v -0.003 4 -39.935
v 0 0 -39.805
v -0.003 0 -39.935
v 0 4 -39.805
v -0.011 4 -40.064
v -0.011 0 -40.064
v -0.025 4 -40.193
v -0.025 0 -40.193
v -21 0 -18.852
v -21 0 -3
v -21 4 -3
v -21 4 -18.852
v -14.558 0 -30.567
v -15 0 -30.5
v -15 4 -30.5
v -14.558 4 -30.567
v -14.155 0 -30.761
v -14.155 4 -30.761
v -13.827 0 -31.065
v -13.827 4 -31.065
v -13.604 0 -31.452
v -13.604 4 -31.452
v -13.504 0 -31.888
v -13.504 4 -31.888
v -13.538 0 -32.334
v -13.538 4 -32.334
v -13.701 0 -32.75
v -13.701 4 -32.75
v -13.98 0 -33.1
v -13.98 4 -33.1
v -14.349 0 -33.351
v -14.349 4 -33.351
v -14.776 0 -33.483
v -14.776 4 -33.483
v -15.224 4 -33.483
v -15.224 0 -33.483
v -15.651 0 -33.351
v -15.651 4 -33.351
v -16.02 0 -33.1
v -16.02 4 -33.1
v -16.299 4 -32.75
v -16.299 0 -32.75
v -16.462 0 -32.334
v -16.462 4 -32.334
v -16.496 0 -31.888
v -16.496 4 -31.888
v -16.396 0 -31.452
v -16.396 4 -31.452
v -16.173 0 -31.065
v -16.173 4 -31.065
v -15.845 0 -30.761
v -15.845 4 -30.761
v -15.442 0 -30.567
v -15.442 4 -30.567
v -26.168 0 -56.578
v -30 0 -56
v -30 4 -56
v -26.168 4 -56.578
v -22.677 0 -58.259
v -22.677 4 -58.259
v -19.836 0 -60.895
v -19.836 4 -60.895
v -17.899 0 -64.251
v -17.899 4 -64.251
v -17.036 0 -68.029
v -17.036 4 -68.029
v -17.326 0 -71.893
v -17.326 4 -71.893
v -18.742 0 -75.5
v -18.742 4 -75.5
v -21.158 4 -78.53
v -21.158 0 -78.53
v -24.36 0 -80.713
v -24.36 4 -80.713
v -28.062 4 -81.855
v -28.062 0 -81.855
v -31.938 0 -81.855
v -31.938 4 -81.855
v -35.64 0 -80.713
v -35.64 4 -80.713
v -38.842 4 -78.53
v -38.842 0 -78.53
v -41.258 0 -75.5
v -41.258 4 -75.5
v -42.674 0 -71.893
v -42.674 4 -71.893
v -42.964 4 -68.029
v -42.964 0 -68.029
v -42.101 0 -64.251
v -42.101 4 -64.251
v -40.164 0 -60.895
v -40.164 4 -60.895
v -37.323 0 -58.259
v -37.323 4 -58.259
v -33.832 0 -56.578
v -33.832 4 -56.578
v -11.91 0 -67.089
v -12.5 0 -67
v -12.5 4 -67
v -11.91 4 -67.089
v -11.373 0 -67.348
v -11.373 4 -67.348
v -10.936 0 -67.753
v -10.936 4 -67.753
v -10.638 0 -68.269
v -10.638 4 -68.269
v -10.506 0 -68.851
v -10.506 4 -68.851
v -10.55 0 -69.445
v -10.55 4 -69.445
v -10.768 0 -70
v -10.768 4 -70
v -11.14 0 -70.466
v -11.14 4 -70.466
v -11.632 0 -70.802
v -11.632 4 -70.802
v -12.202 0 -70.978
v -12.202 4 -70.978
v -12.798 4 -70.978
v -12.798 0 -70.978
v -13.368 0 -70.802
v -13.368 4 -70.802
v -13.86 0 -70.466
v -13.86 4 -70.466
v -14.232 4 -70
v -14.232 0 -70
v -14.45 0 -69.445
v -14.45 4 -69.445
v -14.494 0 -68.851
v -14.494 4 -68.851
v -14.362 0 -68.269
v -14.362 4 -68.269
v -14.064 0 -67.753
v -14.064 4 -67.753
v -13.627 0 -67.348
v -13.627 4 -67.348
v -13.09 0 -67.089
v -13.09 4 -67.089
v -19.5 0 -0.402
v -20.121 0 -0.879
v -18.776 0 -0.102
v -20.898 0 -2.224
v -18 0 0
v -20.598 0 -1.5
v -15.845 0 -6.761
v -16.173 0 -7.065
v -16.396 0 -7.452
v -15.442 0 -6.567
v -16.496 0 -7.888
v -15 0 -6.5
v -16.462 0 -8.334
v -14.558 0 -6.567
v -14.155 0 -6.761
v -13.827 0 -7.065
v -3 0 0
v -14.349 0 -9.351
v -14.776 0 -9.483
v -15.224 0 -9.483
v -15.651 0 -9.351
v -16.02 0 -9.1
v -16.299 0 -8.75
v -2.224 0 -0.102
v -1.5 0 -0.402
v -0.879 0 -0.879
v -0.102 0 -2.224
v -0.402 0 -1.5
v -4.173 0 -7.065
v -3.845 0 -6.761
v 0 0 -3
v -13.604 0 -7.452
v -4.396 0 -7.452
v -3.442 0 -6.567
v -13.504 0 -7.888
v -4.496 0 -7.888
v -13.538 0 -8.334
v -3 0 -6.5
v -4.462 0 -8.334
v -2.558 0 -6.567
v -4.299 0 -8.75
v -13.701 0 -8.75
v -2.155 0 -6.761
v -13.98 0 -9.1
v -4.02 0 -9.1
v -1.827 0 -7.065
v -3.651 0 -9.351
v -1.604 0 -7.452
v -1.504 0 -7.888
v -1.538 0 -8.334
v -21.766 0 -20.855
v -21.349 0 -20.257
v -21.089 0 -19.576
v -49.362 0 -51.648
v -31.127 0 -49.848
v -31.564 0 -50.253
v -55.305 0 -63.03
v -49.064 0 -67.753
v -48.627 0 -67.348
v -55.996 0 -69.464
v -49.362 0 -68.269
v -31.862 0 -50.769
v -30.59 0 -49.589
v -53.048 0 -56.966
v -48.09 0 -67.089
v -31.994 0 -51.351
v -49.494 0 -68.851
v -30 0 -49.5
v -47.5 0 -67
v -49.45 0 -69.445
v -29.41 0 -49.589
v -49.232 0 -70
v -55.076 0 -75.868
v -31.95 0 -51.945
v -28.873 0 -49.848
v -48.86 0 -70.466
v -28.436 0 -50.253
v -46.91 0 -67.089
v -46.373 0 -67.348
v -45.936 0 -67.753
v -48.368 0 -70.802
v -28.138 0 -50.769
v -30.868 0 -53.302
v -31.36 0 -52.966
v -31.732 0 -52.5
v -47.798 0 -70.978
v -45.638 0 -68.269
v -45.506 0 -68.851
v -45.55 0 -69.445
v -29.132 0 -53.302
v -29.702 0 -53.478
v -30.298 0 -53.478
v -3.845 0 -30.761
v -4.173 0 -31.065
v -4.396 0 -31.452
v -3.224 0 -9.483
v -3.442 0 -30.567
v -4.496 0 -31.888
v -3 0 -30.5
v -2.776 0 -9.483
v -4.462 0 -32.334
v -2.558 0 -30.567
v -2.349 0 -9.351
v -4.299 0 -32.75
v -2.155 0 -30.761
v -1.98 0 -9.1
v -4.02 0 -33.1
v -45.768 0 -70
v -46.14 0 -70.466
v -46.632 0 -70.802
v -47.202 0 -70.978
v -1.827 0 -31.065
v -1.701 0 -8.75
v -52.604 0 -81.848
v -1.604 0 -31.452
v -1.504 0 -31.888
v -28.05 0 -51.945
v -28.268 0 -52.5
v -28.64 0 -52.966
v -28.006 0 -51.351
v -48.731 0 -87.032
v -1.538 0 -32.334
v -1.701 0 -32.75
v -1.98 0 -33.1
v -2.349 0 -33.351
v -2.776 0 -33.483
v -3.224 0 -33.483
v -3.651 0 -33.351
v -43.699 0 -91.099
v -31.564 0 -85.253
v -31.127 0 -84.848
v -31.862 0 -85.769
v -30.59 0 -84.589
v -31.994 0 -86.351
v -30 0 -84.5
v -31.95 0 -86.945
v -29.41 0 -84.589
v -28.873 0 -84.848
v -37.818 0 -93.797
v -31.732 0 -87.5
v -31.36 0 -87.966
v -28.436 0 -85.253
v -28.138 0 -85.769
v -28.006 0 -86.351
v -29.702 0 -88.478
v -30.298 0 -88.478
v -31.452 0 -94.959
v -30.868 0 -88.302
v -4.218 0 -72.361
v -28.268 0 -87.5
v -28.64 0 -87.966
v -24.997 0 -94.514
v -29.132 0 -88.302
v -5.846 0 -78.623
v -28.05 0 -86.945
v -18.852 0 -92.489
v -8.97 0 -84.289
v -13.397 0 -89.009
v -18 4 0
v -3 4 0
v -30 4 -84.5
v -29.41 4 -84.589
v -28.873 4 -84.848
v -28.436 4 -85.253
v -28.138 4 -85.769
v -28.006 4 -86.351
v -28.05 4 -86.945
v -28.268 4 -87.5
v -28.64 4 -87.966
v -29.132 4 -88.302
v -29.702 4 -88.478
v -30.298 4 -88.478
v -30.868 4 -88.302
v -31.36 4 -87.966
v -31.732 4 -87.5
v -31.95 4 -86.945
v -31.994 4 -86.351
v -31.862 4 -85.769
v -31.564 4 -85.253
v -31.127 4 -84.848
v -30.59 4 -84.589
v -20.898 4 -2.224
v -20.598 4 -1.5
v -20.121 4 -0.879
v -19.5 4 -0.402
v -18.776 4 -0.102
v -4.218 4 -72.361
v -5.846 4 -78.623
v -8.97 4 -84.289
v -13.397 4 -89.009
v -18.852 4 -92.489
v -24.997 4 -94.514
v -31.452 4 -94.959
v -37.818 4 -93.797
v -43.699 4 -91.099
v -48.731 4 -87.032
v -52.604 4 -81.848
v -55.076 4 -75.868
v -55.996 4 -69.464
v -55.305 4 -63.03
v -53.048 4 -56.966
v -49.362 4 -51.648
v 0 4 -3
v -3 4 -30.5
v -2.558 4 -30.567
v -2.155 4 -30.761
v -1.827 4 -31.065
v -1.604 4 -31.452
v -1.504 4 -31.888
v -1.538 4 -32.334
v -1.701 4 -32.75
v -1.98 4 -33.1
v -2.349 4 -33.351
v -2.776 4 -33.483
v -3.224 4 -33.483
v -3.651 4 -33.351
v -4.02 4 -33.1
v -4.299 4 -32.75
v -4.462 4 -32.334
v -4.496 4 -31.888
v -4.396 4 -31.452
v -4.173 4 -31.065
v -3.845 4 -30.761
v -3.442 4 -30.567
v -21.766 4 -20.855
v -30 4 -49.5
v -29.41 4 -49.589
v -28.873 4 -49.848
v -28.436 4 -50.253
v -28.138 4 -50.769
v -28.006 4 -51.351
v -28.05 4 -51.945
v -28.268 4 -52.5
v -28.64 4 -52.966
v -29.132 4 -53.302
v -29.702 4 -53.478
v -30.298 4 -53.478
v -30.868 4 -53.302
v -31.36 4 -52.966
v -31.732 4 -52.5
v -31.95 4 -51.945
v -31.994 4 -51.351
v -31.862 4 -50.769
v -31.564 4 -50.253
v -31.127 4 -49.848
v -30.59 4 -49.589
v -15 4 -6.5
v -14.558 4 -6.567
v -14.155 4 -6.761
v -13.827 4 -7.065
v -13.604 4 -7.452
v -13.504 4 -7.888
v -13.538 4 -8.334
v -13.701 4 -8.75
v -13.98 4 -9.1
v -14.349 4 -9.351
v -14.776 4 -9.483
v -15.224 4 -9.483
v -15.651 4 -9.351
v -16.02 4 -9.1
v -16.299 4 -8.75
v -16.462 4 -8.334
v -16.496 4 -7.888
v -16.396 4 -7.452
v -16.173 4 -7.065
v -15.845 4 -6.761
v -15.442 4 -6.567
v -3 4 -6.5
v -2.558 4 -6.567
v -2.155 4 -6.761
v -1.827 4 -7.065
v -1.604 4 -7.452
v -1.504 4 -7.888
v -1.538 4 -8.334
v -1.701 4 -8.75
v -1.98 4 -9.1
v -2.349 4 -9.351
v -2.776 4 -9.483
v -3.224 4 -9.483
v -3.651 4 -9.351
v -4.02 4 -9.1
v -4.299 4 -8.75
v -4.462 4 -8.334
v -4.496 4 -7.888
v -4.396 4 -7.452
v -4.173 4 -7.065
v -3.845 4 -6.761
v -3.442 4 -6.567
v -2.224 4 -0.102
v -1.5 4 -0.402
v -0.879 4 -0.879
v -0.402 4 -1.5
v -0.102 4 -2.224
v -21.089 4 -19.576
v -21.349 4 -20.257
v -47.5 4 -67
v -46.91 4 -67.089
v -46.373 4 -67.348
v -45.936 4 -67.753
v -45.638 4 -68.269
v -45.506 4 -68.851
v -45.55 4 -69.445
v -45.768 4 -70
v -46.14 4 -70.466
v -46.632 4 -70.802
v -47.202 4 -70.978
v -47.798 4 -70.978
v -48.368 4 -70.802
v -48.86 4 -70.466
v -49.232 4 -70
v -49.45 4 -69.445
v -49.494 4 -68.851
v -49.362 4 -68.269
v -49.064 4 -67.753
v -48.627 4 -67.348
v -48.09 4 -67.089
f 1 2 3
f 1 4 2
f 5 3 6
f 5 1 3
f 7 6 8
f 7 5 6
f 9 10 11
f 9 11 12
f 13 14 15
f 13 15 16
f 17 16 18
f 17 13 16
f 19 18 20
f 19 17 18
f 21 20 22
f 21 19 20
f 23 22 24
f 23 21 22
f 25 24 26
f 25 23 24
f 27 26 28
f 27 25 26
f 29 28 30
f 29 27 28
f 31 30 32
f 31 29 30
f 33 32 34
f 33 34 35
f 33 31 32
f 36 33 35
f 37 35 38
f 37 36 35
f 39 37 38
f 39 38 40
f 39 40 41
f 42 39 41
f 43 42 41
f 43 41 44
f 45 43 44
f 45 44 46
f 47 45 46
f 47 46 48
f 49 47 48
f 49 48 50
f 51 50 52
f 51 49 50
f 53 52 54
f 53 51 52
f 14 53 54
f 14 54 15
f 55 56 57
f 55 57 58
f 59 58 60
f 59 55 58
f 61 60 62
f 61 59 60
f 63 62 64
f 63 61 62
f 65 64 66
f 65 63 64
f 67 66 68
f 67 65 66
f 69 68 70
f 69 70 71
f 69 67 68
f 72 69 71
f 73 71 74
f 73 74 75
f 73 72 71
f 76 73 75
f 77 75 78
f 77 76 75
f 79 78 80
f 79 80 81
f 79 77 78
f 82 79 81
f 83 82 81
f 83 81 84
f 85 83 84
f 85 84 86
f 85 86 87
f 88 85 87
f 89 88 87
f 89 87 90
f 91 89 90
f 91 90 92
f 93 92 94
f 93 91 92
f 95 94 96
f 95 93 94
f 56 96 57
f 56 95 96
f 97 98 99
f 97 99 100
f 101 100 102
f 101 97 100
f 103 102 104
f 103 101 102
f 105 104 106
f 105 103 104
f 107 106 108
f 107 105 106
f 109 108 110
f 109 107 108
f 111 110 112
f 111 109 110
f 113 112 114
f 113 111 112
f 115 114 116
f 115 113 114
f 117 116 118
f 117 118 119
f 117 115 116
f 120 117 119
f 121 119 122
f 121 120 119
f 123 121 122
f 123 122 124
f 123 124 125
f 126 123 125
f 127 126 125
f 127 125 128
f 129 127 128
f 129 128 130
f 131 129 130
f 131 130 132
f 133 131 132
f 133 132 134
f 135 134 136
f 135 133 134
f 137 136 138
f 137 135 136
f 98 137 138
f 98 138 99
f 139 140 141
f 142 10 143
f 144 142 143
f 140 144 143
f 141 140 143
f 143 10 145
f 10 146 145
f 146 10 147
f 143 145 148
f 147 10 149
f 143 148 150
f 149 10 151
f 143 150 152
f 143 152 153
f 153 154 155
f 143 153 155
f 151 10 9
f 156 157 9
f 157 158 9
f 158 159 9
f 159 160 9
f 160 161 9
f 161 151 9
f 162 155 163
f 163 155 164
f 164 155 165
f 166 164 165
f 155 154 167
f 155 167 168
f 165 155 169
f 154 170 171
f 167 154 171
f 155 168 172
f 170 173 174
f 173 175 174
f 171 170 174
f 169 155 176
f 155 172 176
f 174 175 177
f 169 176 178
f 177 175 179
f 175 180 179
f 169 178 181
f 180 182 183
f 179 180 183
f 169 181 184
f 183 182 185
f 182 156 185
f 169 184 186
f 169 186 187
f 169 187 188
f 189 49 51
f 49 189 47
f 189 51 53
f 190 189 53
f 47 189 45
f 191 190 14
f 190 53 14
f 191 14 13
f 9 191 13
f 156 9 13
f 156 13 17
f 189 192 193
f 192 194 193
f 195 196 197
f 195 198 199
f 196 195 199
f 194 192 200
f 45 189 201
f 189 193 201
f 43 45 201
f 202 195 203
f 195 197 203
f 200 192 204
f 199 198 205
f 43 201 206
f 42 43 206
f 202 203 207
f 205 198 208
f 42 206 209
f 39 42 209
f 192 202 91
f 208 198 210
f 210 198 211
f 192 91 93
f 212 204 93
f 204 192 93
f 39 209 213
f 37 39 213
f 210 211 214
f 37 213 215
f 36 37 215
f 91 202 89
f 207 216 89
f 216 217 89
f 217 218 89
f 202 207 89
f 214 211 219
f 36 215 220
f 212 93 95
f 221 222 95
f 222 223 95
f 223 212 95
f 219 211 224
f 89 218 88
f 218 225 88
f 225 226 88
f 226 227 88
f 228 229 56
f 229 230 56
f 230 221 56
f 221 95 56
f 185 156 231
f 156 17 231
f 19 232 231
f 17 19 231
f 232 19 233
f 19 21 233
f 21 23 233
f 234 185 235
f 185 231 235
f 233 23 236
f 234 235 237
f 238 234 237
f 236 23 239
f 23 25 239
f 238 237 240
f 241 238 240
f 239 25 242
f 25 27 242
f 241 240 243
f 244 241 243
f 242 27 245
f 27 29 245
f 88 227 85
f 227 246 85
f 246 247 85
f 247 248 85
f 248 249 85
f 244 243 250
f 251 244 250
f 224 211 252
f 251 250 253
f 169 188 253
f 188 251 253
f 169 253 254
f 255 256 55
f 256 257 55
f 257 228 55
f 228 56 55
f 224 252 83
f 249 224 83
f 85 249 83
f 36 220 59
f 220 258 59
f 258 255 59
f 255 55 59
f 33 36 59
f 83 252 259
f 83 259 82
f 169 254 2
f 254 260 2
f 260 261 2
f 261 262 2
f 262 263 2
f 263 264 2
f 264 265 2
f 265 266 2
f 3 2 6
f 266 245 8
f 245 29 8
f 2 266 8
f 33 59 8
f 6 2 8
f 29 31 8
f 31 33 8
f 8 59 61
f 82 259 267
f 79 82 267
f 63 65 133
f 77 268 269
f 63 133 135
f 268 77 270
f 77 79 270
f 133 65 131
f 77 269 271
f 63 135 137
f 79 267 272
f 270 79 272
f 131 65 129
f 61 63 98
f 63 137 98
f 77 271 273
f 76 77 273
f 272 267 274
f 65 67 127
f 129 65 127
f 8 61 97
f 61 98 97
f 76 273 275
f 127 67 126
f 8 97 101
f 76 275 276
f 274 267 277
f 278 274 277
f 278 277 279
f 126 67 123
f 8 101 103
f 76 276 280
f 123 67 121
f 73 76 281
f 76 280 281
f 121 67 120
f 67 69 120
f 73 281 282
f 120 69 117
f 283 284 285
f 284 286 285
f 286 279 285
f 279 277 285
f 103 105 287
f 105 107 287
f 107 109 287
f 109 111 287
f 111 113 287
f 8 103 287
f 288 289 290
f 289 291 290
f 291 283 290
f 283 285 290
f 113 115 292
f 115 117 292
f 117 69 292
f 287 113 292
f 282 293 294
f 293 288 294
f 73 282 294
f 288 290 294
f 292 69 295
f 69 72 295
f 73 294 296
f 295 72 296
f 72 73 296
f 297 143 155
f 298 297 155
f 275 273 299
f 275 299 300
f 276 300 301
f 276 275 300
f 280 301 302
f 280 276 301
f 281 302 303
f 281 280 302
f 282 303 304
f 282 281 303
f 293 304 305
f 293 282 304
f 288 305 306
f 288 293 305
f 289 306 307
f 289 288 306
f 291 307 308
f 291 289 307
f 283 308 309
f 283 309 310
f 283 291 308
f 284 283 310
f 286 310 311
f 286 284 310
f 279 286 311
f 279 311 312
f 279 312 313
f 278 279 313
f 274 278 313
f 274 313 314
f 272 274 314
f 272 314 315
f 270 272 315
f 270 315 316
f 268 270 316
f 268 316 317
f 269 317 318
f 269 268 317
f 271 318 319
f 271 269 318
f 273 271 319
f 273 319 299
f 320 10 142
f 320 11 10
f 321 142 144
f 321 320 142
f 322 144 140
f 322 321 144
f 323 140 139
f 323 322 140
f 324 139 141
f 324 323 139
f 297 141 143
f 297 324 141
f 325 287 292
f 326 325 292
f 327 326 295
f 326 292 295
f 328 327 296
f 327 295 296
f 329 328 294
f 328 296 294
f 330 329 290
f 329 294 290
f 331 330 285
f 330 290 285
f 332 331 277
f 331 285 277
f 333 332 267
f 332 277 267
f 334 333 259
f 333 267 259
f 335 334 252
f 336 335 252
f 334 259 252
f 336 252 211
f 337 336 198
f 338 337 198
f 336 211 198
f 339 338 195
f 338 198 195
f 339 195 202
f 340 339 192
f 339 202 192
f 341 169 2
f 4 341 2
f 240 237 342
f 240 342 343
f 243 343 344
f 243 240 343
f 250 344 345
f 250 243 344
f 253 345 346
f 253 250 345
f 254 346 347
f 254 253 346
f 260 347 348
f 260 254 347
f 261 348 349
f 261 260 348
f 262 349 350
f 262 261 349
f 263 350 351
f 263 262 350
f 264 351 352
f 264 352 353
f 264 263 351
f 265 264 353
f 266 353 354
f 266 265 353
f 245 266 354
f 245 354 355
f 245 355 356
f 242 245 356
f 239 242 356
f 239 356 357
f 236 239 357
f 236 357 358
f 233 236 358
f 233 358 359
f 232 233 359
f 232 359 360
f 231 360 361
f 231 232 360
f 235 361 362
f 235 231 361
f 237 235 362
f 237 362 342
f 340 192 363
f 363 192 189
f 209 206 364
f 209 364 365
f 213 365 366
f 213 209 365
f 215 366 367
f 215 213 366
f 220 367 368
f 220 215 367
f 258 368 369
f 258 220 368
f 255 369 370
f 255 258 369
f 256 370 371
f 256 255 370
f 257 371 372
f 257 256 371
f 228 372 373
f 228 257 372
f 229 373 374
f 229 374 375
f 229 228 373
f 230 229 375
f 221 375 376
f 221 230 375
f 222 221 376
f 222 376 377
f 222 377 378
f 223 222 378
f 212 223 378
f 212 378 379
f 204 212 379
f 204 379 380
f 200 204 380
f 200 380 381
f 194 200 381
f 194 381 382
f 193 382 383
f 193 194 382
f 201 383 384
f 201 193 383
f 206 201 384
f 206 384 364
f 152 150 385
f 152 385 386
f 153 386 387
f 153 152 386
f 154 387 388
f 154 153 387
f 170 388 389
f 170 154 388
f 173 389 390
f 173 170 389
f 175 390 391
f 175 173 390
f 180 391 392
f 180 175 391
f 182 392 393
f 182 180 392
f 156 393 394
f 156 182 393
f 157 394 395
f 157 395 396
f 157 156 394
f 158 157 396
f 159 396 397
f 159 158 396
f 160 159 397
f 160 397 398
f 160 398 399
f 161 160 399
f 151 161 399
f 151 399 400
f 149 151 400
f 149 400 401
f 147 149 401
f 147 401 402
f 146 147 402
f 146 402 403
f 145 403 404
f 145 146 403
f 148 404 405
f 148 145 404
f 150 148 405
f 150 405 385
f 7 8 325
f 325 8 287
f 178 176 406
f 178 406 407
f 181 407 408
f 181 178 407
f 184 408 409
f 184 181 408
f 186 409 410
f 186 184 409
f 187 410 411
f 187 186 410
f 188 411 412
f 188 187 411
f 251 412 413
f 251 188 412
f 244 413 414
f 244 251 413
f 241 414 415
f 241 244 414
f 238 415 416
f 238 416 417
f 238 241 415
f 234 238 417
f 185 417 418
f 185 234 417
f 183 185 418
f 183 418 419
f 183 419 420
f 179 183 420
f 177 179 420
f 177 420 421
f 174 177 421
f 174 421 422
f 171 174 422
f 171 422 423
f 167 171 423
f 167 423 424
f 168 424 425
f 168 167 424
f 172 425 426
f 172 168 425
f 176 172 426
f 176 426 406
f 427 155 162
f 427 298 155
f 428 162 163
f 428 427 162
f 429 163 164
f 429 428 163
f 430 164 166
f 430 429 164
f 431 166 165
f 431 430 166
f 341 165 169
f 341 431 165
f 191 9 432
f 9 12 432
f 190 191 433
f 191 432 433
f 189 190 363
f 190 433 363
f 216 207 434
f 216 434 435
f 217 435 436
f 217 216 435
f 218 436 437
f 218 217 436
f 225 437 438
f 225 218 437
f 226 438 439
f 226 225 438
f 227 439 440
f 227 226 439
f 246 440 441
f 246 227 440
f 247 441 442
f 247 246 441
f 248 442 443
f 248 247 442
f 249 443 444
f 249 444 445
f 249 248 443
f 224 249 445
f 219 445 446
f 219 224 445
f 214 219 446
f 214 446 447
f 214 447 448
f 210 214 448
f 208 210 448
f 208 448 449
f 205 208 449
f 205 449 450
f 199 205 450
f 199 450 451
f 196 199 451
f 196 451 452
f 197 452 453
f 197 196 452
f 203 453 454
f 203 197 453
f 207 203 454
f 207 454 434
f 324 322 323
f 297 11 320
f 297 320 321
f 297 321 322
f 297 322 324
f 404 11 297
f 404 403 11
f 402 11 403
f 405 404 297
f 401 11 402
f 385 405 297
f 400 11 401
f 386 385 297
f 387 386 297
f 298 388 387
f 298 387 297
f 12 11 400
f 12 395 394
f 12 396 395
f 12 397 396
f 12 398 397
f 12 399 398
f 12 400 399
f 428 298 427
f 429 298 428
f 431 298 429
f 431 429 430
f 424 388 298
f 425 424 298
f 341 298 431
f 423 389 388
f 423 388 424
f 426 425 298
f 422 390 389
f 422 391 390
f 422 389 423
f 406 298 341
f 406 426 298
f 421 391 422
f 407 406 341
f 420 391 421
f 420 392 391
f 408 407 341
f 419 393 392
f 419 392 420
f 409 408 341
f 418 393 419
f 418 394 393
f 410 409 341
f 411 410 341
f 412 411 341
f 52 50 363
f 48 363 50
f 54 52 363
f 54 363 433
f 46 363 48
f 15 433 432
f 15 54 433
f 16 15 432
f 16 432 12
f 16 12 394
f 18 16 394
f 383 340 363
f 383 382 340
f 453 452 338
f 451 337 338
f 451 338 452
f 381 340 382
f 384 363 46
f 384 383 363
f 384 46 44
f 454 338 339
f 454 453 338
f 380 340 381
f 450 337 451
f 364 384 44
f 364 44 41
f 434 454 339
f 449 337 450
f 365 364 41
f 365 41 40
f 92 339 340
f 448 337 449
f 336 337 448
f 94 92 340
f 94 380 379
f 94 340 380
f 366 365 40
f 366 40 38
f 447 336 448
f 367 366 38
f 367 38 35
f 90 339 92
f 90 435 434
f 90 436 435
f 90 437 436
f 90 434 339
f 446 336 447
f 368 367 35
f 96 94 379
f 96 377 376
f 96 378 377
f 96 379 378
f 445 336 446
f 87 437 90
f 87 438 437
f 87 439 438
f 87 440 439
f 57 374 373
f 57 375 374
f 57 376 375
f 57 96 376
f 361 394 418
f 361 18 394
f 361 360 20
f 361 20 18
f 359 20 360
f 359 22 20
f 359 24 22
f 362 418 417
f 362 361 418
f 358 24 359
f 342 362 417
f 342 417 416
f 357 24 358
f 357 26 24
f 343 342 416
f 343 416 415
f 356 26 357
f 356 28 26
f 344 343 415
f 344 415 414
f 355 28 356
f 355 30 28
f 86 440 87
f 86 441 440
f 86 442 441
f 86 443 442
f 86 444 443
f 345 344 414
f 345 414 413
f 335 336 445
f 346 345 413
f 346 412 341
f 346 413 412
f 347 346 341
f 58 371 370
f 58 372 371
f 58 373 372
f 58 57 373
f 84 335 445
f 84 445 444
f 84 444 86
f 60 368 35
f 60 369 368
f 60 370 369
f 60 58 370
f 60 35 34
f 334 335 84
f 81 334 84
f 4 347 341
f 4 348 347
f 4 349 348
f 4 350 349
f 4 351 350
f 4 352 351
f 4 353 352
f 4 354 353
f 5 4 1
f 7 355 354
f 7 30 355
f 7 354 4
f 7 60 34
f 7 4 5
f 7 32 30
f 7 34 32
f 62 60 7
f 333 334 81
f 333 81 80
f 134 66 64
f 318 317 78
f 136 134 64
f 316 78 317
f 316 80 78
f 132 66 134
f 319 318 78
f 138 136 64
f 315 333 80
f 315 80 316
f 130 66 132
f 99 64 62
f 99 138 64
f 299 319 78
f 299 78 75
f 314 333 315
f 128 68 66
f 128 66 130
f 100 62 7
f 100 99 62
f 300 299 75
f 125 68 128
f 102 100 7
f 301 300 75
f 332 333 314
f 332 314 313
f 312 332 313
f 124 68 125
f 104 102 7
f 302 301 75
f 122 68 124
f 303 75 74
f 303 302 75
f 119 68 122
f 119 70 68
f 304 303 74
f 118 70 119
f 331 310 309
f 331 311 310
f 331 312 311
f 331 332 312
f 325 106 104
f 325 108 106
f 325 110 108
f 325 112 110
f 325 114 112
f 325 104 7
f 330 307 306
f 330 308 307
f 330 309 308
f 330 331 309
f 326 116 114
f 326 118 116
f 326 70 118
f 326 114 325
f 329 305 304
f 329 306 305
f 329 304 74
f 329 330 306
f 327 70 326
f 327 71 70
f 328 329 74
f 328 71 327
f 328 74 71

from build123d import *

# Parameters (mm, degrees)
SKETCH_1_R      = 26
SKETCH_1_R_2    = 21
SKETCH_1_W      = 21
SKETCH_1_H      = 40
SKETCH_1_R_3    = 1.5
EXTRUDE_1_DEPTH = 4
EXTRUDE_START   = -4
SKETCH_2_R      = 21
SKETCH_2_R_2    = 13
SKETCH_2_R_3    = 2
EXTRUDE_4_DEPTH = 4
FILLET_1_R      = 3


with BuildPart() as part:
    # 草图1 → 凸台-拉伸1 (new body)
    # profile 1 of 3: a face of its own
    with BuildSketch(Plane(origin=(0, 0, 0), x_dir=(1, 0, 0), z_dir=(0, 1, 0))):
        with Locations((-30, 69)):
            Circle(SKETCH_1_R)
        with Locations(Location((-30, 69, 0), (0, 0, 270))):
            Circle(SKETCH_1_R_2, mode=Mode.SUBTRACT)
    # profile 2 of 3: a face of its own
    with BuildSketch(Plane(origin=(0, 0, 0), x_dir=(1, 0, 0), z_dir=(0, 1, 0))):
        with BuildLine():
            Line((-21, 40), (0, 40))
            Line((0, 40), (-4.218098415, 72.360587846))
            ThreePointArc((-4.218098415, 72.360587846), (-4.054581896, 70.683828791), (-4, 69))
            ThreePointArc((-4, 69), (-20.710760355, 44.716054134), (-49.362309755, 51.647739025))
            Line((-49.362309755, 51.647739025), (-21, 20))
            Line((-21, 20), (-21, 40))
        make_face()
    # profile 3 of 3: a face of its own
    with BuildSketch(Plane(origin=(0, 0, 0), x_dir=(1, 0, 0), z_dir=(0, 1, 0))):
        with Locations((-10.5, 20)):
            Rectangle(SKETCH_1_W, SKETCH_1_H)
        with Locations(Location((-15, 8, 0), (0, 0, 270))):
            Circle(SKETCH_1_R_3, mode=Mode.SUBTRACT)
        with Locations(Location((-3, 8, 0), (0, 0, 270))):
            Circle(SKETCH_1_R_3, mode=Mode.SUBTRACT)
        with Locations(Location((-3, 32, 0), (0, 0, 270))):
            Circle(SKETCH_1_R_3, mode=Mode.SUBTRACT)
        with Locations(Location((-15, 32, 0), (0, 0, 270))):
            Circle(SKETCH_1_R_3, mode=Mode.SUBTRACT)
    extrude(amount=EXTRUDE_1_DEPTH)

    # 草图2 → 凸台-拉伸4 (add)
    with BuildSketch(Plane(origin=(0, 4, 0), x_dir=(1, 0, 0), z_dir=(0, 1, 0)).offset(EXTRUDE_START)):
        with Locations((-30, 69)):
            Circle(SKETCH_2_R)
        with Locations(Location((-30, 69, 0), (0, 0, 270))):
            Circle(SKETCH_2_R_2, mode=Mode.SUBTRACT)
        with Locations(Location((-12.5, 69, 0), (0, 0, 270))):
            Circle(SKETCH_2_R_3, mode=Mode.SUBTRACT)
        with Locations(Location((-30, 51.5, 0), (0, 0, 270))):
            Circle(SKETCH_2_R_3, mode=Mode.SUBTRACT)
        with Locations(Location((-47.5, 69, 0), (0, 0, 270))):
            Circle(SKETCH_2_R_3, mode=Mode.SUBTRACT)
        with Locations(Location((-30, 86.5, 0), (0, 0, 270))):
            Circle(SKETCH_2_R_3, mode=Mode.SUBTRACT)
    extrude(amount=EXTRUDE_4_DEPTH)

    # 圆角1
    fillet_1_edges = [part.edges().sort_by_distance(p)[0] for p in [
        (0, 2, -40),
        (0, 2, 0),
        (-21, 2, 0),
        (-21, 2, -20),
    ]]
    fillet(fillet_1_edges, radius=FILLET_1_R)


solid = part.part
